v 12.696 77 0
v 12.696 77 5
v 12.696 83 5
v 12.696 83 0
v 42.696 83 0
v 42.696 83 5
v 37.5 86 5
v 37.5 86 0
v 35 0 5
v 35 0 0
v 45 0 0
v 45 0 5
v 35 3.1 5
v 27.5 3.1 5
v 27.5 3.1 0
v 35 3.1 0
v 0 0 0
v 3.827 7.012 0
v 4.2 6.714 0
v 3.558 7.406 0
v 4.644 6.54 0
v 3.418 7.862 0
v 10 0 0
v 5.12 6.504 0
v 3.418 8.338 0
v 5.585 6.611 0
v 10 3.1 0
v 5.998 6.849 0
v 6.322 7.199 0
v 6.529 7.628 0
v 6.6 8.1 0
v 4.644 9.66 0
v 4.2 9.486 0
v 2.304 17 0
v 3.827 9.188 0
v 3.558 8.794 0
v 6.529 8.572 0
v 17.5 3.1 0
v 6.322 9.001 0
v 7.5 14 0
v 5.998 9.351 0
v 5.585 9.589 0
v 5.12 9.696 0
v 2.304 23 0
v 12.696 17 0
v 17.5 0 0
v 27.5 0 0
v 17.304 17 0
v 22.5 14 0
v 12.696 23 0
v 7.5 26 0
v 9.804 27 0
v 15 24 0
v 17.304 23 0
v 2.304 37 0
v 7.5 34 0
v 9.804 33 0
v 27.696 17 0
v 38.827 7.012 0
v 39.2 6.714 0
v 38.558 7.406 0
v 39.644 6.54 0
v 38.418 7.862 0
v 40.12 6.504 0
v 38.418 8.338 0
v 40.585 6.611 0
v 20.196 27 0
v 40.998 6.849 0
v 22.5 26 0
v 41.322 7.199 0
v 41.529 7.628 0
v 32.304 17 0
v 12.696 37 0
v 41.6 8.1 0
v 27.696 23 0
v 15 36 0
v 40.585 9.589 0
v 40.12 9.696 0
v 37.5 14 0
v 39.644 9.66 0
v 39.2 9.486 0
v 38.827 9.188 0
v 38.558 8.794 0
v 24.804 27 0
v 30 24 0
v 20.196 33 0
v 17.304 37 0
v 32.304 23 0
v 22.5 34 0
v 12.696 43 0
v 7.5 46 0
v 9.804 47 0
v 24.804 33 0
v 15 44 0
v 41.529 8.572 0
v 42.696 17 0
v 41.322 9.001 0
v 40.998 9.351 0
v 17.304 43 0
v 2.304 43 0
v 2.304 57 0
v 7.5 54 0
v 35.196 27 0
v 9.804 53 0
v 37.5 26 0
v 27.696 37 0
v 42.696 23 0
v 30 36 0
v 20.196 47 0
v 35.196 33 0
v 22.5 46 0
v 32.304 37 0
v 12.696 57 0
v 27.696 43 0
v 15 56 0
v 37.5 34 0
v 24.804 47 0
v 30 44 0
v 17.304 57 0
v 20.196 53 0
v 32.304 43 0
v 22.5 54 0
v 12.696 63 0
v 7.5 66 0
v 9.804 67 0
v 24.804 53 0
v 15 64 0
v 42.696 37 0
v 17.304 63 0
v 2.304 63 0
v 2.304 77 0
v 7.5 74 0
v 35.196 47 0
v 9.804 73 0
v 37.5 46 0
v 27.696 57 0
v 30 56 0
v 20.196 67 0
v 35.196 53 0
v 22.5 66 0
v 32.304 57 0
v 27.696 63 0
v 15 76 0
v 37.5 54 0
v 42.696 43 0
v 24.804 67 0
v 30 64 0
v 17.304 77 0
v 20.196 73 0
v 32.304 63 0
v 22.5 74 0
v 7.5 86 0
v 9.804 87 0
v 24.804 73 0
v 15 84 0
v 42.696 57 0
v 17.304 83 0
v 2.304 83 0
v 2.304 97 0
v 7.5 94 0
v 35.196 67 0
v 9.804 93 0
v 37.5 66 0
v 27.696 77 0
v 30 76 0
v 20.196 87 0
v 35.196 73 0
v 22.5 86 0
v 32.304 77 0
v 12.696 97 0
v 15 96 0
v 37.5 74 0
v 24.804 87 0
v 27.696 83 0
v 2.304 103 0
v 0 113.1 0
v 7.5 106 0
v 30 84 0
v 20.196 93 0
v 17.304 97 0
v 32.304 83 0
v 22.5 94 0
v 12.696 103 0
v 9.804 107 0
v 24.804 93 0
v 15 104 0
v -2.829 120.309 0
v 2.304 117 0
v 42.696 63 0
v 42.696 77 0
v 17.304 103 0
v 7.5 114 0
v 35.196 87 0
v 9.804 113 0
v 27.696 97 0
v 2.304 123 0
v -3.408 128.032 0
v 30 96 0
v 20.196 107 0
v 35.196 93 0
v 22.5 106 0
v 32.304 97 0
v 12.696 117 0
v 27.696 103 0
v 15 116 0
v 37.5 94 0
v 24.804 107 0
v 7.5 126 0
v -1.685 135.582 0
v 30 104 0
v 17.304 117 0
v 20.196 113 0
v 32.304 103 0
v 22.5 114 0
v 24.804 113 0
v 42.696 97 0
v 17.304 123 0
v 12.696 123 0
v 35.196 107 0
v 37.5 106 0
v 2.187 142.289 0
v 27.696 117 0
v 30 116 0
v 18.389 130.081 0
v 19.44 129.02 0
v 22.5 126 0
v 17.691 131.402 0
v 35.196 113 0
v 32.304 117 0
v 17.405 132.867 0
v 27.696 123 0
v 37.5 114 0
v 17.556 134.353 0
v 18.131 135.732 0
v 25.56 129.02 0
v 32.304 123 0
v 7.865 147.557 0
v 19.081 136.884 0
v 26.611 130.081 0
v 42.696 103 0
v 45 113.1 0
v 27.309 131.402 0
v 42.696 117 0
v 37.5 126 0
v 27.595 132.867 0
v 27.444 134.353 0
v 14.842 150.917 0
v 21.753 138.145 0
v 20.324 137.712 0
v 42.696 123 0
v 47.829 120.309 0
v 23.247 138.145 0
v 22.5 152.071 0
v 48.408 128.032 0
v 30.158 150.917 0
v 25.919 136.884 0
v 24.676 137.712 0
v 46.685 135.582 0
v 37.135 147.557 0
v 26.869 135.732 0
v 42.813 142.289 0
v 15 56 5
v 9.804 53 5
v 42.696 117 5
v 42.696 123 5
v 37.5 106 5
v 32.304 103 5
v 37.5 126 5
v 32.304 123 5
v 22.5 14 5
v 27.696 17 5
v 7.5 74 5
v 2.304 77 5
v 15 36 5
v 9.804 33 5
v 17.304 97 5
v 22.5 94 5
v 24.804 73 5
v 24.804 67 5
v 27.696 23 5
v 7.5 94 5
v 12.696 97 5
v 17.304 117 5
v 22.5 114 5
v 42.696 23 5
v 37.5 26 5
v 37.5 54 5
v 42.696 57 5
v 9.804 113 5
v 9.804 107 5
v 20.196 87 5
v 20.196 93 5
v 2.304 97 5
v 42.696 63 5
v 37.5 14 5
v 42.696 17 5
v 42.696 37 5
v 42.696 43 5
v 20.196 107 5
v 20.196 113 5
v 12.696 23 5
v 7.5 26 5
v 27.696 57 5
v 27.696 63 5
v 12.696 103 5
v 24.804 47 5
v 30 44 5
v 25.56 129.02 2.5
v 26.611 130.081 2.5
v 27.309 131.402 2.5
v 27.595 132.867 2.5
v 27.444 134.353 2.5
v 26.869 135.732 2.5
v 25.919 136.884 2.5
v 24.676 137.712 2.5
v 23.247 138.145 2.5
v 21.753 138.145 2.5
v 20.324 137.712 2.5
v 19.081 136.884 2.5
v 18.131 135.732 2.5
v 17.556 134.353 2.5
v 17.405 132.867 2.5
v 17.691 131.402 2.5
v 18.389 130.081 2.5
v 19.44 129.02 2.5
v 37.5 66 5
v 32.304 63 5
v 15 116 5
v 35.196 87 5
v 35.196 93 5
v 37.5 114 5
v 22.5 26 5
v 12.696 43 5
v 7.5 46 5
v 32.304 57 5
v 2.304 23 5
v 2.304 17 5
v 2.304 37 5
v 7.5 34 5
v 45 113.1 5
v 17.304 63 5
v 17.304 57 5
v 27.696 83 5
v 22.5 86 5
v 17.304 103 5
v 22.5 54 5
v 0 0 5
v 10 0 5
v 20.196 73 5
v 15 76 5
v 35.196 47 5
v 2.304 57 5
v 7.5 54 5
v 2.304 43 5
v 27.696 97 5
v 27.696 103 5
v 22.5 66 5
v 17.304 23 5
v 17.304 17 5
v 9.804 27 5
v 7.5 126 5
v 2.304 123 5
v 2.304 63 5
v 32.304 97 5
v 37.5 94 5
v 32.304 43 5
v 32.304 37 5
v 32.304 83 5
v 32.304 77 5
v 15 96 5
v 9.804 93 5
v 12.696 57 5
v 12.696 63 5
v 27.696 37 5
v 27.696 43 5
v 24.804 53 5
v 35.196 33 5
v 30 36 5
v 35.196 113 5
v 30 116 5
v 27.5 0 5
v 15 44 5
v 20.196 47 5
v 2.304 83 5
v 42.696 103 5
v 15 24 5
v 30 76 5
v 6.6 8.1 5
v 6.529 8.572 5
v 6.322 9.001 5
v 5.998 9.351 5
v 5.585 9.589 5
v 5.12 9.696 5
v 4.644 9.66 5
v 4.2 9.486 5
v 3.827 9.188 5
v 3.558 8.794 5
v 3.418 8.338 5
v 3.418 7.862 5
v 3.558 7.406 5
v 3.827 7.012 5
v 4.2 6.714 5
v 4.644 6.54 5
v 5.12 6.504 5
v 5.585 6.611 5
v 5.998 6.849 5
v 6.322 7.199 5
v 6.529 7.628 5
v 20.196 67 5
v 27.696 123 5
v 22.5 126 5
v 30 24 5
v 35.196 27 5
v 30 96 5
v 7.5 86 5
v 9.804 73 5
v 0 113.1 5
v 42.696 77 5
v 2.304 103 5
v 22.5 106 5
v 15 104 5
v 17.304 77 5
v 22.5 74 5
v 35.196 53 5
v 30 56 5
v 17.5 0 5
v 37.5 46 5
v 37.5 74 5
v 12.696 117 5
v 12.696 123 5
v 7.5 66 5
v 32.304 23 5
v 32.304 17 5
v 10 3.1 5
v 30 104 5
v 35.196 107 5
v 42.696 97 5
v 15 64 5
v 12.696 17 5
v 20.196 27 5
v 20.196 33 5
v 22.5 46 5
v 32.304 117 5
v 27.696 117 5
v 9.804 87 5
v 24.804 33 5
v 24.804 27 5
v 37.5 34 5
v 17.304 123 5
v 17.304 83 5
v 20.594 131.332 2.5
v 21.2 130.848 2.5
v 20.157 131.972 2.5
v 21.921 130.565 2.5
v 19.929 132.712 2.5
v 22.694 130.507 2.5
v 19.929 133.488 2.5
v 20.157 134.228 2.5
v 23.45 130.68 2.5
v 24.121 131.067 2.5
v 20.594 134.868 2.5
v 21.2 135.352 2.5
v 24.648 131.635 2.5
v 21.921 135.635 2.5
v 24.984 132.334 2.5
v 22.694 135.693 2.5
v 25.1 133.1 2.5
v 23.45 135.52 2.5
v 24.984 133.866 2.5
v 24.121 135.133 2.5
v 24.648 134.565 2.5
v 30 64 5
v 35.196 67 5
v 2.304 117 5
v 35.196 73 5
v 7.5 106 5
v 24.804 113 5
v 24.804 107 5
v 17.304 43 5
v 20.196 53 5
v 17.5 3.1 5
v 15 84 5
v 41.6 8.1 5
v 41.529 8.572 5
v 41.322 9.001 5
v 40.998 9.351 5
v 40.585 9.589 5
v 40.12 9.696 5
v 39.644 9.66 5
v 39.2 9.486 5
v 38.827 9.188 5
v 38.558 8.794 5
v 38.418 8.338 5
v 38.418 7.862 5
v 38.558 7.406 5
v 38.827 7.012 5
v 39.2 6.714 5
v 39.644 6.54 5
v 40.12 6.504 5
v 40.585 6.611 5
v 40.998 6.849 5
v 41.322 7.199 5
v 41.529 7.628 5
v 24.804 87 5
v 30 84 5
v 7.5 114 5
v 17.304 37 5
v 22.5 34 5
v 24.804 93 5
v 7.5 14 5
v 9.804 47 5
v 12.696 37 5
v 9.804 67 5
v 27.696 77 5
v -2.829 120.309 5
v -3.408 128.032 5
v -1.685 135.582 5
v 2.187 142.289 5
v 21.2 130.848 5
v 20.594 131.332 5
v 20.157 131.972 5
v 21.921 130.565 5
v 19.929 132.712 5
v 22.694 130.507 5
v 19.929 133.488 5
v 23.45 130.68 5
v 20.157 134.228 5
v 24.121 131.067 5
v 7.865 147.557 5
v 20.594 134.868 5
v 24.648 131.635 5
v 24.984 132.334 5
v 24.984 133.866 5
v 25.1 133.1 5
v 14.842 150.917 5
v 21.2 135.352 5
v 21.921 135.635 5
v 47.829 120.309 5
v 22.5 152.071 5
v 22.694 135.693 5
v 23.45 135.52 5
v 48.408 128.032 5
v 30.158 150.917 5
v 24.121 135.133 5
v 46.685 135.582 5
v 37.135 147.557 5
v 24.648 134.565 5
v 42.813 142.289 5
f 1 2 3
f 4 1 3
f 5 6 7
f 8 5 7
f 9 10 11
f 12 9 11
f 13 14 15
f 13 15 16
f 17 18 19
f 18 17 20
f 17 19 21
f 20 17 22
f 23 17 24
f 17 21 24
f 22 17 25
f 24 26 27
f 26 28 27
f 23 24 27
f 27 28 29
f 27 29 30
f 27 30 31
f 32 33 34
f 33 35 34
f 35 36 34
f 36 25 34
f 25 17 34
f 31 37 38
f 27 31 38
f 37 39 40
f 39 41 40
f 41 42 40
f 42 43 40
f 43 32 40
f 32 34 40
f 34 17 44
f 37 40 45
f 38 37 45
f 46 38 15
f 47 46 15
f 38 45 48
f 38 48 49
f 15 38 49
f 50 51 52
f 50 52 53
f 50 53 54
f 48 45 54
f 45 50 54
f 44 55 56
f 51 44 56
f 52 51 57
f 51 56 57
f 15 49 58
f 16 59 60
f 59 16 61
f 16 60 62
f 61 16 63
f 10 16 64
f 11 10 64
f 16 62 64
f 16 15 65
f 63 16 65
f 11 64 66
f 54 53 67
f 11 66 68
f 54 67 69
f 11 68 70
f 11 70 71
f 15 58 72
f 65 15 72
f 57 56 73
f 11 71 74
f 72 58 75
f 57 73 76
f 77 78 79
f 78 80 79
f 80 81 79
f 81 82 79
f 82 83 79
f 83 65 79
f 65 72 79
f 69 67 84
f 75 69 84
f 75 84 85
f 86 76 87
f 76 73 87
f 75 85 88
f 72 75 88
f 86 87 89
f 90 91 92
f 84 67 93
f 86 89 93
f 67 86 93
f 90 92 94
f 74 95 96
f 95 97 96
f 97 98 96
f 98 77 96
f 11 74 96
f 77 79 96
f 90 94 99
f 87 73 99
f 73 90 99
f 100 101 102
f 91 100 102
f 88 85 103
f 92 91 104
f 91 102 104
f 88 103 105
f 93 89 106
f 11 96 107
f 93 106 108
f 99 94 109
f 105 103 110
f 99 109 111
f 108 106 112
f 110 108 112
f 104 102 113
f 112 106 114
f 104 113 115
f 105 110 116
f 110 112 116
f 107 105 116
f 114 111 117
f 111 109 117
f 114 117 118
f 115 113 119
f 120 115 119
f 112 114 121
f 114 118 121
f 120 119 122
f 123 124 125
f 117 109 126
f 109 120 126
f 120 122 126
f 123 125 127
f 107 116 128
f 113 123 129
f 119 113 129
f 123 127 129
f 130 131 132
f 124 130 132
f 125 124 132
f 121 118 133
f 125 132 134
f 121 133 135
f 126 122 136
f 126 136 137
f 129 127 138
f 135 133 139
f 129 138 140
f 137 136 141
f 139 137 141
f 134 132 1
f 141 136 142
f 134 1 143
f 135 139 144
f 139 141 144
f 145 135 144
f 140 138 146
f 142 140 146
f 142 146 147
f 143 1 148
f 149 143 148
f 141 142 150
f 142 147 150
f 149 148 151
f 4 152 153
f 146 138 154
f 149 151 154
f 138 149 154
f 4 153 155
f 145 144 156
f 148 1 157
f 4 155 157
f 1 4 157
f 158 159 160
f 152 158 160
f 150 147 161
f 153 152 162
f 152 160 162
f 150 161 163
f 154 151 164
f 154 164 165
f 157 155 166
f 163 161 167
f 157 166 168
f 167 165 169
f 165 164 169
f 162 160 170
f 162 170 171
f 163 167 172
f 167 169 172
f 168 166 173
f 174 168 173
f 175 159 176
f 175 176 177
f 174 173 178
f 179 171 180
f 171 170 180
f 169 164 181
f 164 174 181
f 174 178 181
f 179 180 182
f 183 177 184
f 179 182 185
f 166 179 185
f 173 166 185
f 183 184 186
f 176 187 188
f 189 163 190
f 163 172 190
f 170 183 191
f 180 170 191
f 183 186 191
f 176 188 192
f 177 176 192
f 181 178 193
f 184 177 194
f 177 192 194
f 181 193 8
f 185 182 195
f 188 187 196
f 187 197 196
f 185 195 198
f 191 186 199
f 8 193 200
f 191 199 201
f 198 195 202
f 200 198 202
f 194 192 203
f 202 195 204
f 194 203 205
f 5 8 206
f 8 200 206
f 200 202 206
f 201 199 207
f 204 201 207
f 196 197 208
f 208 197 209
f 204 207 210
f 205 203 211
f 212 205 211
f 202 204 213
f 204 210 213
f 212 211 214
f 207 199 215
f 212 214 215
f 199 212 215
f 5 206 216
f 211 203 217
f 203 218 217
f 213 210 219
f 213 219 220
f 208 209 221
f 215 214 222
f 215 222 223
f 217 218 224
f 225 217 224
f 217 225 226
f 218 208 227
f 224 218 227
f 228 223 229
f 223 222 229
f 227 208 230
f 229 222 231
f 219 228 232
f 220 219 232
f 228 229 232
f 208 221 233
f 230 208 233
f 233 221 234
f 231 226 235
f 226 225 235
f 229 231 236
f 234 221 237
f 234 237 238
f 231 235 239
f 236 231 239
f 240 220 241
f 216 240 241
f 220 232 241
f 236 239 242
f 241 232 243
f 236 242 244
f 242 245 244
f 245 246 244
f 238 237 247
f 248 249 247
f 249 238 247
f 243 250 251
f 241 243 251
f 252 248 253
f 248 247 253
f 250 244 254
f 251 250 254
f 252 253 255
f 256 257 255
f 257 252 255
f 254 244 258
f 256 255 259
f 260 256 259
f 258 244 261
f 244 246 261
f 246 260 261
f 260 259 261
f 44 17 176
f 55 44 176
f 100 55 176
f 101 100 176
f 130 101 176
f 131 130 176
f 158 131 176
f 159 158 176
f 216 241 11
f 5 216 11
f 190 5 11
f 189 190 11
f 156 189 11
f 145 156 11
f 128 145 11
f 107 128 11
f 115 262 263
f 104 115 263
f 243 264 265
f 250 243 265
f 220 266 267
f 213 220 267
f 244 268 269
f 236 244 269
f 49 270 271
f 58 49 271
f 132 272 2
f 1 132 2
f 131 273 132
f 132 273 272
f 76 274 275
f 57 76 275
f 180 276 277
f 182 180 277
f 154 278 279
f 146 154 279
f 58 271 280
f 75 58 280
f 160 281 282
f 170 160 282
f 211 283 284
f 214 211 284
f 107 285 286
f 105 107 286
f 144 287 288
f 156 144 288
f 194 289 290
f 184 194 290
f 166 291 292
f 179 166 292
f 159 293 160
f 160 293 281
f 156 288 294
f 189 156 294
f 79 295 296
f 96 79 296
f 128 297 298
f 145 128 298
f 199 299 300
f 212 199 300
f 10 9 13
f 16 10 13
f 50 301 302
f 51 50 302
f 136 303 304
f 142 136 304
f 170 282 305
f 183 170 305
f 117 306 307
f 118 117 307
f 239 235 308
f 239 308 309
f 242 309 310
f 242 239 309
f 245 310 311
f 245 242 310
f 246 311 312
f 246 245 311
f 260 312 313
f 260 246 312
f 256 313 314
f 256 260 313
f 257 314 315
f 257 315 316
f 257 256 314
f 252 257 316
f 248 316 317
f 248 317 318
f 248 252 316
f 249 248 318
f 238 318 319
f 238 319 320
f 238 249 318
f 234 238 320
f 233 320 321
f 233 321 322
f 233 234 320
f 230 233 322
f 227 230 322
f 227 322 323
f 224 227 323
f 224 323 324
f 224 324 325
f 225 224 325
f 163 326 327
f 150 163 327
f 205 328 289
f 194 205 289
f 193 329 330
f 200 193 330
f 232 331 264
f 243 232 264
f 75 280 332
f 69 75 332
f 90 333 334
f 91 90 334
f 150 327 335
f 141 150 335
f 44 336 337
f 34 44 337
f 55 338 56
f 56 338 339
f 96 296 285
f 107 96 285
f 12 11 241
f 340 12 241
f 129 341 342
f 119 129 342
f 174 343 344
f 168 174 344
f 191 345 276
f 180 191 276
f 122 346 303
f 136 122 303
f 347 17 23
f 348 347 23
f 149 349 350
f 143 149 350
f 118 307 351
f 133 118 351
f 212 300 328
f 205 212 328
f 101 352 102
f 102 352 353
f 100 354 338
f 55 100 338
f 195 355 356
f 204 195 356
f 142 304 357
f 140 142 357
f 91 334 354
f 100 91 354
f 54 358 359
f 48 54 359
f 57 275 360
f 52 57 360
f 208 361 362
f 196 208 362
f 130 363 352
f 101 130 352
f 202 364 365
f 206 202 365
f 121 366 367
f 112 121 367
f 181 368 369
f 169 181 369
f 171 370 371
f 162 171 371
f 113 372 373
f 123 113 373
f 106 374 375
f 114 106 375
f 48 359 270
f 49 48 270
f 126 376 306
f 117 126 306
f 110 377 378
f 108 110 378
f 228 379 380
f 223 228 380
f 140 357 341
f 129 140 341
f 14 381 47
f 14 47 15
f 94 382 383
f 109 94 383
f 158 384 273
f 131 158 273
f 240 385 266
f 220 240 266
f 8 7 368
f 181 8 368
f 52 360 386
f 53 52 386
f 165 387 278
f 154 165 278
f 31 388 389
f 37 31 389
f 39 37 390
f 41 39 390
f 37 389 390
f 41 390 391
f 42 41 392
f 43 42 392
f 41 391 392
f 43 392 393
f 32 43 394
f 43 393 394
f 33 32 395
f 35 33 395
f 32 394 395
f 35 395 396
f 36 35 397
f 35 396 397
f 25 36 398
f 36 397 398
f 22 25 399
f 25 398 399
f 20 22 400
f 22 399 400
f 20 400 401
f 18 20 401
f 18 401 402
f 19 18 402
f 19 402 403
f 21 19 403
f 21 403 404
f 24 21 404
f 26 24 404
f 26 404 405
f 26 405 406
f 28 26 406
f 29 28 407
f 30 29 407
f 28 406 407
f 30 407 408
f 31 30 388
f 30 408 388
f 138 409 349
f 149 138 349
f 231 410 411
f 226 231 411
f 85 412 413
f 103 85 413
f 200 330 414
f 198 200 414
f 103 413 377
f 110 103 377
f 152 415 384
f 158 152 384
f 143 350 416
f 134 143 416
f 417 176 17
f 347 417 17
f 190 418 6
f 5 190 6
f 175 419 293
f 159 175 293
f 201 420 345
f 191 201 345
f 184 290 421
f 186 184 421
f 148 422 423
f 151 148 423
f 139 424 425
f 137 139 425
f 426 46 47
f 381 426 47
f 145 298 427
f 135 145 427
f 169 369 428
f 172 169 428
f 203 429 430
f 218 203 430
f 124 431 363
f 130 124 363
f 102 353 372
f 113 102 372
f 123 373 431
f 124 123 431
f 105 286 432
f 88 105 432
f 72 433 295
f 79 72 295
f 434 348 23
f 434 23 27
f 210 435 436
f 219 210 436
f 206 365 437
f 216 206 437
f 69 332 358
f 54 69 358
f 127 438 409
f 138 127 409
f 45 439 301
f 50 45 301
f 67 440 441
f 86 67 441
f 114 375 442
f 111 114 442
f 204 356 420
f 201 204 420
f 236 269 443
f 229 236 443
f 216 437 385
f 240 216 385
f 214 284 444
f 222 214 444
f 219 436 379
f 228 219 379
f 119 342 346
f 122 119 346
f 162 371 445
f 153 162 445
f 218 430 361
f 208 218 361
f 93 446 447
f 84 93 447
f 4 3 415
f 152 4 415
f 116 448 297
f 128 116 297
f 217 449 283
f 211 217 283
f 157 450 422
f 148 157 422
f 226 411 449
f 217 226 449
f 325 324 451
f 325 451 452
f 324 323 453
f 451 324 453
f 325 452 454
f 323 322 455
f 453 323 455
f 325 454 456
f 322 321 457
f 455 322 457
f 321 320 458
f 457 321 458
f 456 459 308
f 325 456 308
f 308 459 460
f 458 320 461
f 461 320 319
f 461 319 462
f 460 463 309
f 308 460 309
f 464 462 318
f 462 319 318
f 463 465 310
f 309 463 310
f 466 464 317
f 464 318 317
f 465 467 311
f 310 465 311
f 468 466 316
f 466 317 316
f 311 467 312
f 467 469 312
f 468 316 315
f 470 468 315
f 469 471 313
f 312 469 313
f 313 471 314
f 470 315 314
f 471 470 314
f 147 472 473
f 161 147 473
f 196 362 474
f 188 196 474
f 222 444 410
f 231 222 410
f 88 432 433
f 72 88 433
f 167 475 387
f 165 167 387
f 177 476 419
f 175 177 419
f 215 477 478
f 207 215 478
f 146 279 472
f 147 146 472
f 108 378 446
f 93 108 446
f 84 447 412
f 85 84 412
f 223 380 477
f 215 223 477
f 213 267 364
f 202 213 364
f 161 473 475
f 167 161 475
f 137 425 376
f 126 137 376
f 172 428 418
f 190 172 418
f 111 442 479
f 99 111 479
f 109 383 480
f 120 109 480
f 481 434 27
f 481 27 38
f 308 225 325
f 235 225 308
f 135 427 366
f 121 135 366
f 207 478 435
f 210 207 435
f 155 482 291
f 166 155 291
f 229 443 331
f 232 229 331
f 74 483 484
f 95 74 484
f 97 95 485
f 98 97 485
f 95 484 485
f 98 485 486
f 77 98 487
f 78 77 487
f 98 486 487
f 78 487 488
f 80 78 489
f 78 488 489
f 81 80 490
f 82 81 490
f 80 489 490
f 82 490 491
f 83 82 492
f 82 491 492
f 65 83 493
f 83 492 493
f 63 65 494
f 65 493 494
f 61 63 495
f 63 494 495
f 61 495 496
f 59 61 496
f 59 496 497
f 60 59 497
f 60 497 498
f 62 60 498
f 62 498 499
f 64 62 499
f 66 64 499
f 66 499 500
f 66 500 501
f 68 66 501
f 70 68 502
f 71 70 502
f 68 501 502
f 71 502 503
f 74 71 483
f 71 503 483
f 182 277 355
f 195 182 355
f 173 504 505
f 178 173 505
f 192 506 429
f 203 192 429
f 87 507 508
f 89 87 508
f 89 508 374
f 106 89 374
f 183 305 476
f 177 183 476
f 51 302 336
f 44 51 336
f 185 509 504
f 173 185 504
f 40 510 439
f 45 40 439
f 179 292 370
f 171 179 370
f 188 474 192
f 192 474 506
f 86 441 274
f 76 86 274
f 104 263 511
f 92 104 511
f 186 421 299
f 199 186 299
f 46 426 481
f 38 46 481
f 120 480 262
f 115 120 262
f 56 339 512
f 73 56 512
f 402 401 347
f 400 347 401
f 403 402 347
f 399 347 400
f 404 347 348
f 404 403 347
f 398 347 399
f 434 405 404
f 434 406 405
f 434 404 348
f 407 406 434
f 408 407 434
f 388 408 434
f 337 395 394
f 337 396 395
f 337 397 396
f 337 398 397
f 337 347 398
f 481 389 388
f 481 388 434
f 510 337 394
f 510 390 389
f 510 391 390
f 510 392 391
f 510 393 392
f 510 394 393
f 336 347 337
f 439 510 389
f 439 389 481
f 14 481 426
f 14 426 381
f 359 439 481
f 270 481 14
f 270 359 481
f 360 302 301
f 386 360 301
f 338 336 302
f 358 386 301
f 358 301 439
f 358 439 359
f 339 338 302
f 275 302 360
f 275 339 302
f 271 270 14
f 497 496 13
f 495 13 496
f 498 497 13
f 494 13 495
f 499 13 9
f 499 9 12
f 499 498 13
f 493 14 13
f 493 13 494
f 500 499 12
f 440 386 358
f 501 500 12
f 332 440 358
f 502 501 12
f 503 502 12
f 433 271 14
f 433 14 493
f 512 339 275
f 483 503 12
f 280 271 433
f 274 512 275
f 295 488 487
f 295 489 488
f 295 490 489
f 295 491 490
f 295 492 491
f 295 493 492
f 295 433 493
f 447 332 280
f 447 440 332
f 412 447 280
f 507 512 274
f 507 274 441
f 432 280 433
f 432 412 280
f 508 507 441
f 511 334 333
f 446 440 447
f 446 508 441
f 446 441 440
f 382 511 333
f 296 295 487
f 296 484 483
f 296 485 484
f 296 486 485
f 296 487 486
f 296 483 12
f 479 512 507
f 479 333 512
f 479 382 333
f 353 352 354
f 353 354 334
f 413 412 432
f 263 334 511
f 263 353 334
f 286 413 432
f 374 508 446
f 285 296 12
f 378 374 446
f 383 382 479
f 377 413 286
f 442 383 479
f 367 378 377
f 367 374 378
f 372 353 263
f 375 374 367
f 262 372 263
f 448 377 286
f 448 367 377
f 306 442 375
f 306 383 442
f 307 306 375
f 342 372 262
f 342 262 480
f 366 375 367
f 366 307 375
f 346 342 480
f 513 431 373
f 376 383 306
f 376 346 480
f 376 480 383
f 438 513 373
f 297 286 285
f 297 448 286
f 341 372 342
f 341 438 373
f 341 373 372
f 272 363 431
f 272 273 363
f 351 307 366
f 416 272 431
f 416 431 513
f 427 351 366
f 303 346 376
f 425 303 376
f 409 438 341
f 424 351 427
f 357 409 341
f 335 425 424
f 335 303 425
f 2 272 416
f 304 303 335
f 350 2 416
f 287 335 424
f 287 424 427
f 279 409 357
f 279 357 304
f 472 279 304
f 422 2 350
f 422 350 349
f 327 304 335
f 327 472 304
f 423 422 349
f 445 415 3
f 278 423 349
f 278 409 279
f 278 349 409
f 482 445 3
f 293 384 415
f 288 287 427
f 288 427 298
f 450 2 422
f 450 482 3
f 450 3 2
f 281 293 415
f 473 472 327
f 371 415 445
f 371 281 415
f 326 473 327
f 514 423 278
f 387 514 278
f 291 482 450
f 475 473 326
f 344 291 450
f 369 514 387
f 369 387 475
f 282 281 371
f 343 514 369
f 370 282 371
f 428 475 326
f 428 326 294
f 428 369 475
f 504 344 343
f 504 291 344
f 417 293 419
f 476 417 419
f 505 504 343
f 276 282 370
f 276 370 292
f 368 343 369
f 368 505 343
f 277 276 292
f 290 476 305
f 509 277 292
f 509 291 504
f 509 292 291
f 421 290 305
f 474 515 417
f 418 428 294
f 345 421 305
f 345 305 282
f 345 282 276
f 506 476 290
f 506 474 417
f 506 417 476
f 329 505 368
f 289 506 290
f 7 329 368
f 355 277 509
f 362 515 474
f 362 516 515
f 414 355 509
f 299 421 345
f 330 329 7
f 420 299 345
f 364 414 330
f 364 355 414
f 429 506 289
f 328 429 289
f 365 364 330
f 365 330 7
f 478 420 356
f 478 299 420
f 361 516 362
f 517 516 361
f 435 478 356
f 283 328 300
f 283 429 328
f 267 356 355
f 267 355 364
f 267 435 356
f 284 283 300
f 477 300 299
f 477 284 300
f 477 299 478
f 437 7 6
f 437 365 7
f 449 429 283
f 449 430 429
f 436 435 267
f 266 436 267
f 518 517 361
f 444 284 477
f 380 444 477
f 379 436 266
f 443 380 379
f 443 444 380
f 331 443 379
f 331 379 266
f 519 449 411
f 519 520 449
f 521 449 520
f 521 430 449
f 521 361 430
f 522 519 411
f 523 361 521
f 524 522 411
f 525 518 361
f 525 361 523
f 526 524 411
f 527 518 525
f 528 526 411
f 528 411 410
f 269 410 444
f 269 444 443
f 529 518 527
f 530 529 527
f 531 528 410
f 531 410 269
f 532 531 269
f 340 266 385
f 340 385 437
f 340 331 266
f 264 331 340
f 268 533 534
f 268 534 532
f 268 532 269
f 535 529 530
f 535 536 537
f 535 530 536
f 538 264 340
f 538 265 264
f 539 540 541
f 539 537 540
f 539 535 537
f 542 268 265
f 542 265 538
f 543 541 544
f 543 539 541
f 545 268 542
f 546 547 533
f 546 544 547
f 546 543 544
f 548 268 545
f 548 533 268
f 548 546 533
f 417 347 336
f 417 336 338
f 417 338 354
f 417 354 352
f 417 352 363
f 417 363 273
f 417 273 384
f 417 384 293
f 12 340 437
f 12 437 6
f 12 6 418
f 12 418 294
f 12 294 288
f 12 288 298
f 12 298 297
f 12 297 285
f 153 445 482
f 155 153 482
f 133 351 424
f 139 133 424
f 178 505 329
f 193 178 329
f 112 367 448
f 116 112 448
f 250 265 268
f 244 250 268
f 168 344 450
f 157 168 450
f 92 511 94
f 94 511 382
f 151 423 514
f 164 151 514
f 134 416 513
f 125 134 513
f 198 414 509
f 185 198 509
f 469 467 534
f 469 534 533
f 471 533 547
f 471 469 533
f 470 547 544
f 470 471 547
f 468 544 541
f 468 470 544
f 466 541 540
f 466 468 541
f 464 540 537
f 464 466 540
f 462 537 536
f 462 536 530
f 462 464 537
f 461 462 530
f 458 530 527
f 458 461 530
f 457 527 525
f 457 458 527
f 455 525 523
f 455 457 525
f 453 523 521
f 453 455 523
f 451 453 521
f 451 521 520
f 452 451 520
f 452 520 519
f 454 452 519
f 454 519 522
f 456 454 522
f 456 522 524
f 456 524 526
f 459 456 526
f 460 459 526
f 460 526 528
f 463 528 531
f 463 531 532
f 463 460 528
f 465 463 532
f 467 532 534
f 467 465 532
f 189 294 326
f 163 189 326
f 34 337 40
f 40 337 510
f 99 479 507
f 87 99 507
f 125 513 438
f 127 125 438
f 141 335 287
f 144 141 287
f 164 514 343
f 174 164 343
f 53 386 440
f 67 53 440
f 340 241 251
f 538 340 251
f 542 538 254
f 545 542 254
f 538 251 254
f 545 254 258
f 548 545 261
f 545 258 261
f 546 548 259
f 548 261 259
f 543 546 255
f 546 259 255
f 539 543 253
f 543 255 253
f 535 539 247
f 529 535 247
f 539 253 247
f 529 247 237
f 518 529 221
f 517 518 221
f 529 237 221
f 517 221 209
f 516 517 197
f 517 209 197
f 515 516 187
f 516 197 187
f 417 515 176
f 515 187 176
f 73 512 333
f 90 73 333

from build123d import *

# Parameters (mm, degrees)
EXTRUDE_1_DEPTH     = 5
SKETCH_2_R          = 1.6
SKETCH_2_W          = 7.5
SKETCH_2_H          = 3.1
CUT_EXTRUDE_1_DEPTH = 5
EXTRUDE_START       = -2.5
SKETCH_3_R          = 2.6
EXTRUDE_2_DEPTH     = 2.5


with BuildPart() as part:
    # 草图1 → 凸台-拉伸1 (new body)
    with BuildSketch(Plane.XY):
        with BuildLine():
            Line((0, 0), (45, 0))
            Line((45, 0), (45, 113.1))
            ThreePointArc((45, 113.1), (22.5, 152.07114317), (0, 113.1))
            Line((0, 113.1), (0, 0))
        make_face()
        with BuildLine():
            Line((19.44, 129.02), (25.56, 129.02))
            ThreePointArc((25.56, 129.02), (22.5, 138.2), (19.44, 129.02))
        make_face(mode=Mode.SUBTRACT)
    extrude(amount=EXTRUDE_1_DEPTH)

    # 草图2 → 切除-拉伸1 (cut)
    with BuildSketch(Plane.XY.offset(5)):
        with Locations((40, 8.1)):
            Circle(SKETCH_2_R)
        with Locations((5, 8.1)):
            Circle(SKETCH_2_R)
        with Locations((31.25, 1.55)):
            Rectangle(SKETCH_2_W, SKETCH_2_H)
        with Locations((13.75, 1.55)):
            Rectangle(SKETCH_2_W, SKETCH_2_H)
        Polygon((7.5, 26), (2.303847577, 23), (2.303847577, 17), (7.5, 14), (12.696152423, 17), (12.696152423, 23), align=None)
        Polygon((22.5, 26), (17.303847577, 23), (17.303847577, 17), (22.5, 14), (27.696152423, 17), (27.696152423, 23), align=None)
        Polygon((37.5, 26), (32.303847577, 23), (32.303847577, 17), (37.5, 14), (42.696152423, 17), (42.696152423, 23), align=None)
        Polygon((15, 56), (9.803847577, 53), (9.803847577, 47), (15, 44), (20.196152423, 47), (20.196152423, 53), align=None)
        Polygon((15, 36), (9.803847577, 33), (9.803847577, 27), (15, 24), (20.196152423, 27), (20.196152423, 33), align=None)
        Polygon((30, 36), (24.803847577, 33), (24.803847577, 27), (30, 24), (35.196152423, 27), (35.196152423, 33), align=None)
        Polygon((30, 56), (24.803847577, 53), (24.803847577, 47), (30, 44), (35.196152423, 47), (35.196152423, 53), align=None)
        Polygon((37.5, 46), (32.303847577, 43), (32.303847577, 37), (37.5, 34), (42.696152423, 37), (42.696152423, 43), align=None)
        Polygon((22.5, 46), (17.303847577, 43), (17.303847577, 37), (22.5, 34), (27.696152423, 37), (27.696152423, 43), align=None)
        Polygon((7.5, 46), (2.303847577, 43), (2.303847577, 37), (7.5, 34), (12.696152423, 37), (12.696152423, 43), align=None)
        Polygon((15, 76), (9.803847577, 73), (9.803847577, 67), (15, 64), (20.196152423, 67), (20.196152423, 73), align=None)
        Polygon((30, 76), (24.803847577, 73), (24.803847577, 67), (30, 64), (35.196152423, 67), (35.196152423, 73), align=None)
        Polygon((37.5, 66), (32.303847577, 63), (32.303847577, 57), (37.5, 54), (42.696152423, 57), (42.696152423, 63), align=None)
        Polygon((22.5, 66), (17.303847577, 63), (17.303847577, 57), (22.5, 54), (27.696152423, 57), (27.696152423, 63), align=None)
        Polygon((7.5, 66), (2.303847577, 63), (2.303847577, 57), (7.5, 54), (12.696152423, 57), (12.696152423, 63), align=None)
        Polygon((15, 96), (9.803847577, 93), (9.803847577, 87), (15, 84), (20.196152423, 87), (20.196152423, 93), align=None)
        Polygon((30, 96), (24.803847577, 93), (24.803847577, 87), (30, 84), (35.196152423, 87), (35.196152423, 93), align=None)
        Polygon((37.5, 86), (32.303847577, 83), (32.303847577, 77), (37.5, 74), (42.696152423, 77), (42.696152423, 83), align=None)
        Polygon((22.5, 86), (17.303847577, 83), (17.303847577, 77), (22.5, 74), (27.696152423, 77), (27.696152423, 83), align=None)
        Polygon((7.5, 86), (2.303847577, 83), (2.303847577, 77), (7.5, 74), (12.696152423, 77), (12.696152423, 83), align=None)
        Polygon((15, 116), (9.803847577, 113), (9.803847577, 107), (15, 104), (20.196152423, 107), (20.196152423, 113), align=None)
        Polygon((30, 116), (24.803847577, 113), (24.803847577, 107), (30, 104), (35.196152423, 107), (35.196152423, 113), align=None)
        Polygon((37.5, 106), (32.303847577, 103), (32.303847577, 97), (37.5, 94), (42.696152423, 97), (42.696152423, 103), align=None)
        Polygon((22.5, 106), (17.303847577, 103), (17.303847577, 97), (22.5, 94), (27.696152423, 97), (27.696152423, 103), align=None)
        Polygon((7.5, 106), (2.303847577, 103), (2.303847577, 97), (7.5, 94), (12.696152423, 97), (12.696152423, 103), align=None)
        Polygon((7.5, 126), (2.303847577, 123), (2.303847577, 117), (7.5, 114), (12.696152423, 117), (12.696152423, 123), align=None)
        Polygon((22.5, 126), (17.303847577, 123), (17.303847577, 117), (22.5, 114), (27.696152423, 117), (27.696152423, 123), align=None)
        Polygon((37.5, 126), (32.303847577, 123), (32.303847577, 117), (37.5, 114), (42.696152423, 117), (42.696152423, 123), align=None)
    extrude(amount=-CUT_EXTRUDE_1_DEPTH, mode=Mode.SUBTRACT)

    # 草图3 → 凸台-拉伸2 (add)
    with BuildSketch(Plane.XY.offset(5).offset(EXTRUDE_START)):
        with BuildLine():
            Line((19.44, 129.02), (25.56, 129.02))
            ThreePointArc((25.56, 129.02), (22.5, 138.2), (19.44, 129.02))
        make_face()
        with Locations((22.5, 133.1)):
            Circle(SKETCH_3_R, mode=Mode.SUBTRACT)
    extrude(amount=EXTRUDE_2_DEPTH)


solid = part.part
